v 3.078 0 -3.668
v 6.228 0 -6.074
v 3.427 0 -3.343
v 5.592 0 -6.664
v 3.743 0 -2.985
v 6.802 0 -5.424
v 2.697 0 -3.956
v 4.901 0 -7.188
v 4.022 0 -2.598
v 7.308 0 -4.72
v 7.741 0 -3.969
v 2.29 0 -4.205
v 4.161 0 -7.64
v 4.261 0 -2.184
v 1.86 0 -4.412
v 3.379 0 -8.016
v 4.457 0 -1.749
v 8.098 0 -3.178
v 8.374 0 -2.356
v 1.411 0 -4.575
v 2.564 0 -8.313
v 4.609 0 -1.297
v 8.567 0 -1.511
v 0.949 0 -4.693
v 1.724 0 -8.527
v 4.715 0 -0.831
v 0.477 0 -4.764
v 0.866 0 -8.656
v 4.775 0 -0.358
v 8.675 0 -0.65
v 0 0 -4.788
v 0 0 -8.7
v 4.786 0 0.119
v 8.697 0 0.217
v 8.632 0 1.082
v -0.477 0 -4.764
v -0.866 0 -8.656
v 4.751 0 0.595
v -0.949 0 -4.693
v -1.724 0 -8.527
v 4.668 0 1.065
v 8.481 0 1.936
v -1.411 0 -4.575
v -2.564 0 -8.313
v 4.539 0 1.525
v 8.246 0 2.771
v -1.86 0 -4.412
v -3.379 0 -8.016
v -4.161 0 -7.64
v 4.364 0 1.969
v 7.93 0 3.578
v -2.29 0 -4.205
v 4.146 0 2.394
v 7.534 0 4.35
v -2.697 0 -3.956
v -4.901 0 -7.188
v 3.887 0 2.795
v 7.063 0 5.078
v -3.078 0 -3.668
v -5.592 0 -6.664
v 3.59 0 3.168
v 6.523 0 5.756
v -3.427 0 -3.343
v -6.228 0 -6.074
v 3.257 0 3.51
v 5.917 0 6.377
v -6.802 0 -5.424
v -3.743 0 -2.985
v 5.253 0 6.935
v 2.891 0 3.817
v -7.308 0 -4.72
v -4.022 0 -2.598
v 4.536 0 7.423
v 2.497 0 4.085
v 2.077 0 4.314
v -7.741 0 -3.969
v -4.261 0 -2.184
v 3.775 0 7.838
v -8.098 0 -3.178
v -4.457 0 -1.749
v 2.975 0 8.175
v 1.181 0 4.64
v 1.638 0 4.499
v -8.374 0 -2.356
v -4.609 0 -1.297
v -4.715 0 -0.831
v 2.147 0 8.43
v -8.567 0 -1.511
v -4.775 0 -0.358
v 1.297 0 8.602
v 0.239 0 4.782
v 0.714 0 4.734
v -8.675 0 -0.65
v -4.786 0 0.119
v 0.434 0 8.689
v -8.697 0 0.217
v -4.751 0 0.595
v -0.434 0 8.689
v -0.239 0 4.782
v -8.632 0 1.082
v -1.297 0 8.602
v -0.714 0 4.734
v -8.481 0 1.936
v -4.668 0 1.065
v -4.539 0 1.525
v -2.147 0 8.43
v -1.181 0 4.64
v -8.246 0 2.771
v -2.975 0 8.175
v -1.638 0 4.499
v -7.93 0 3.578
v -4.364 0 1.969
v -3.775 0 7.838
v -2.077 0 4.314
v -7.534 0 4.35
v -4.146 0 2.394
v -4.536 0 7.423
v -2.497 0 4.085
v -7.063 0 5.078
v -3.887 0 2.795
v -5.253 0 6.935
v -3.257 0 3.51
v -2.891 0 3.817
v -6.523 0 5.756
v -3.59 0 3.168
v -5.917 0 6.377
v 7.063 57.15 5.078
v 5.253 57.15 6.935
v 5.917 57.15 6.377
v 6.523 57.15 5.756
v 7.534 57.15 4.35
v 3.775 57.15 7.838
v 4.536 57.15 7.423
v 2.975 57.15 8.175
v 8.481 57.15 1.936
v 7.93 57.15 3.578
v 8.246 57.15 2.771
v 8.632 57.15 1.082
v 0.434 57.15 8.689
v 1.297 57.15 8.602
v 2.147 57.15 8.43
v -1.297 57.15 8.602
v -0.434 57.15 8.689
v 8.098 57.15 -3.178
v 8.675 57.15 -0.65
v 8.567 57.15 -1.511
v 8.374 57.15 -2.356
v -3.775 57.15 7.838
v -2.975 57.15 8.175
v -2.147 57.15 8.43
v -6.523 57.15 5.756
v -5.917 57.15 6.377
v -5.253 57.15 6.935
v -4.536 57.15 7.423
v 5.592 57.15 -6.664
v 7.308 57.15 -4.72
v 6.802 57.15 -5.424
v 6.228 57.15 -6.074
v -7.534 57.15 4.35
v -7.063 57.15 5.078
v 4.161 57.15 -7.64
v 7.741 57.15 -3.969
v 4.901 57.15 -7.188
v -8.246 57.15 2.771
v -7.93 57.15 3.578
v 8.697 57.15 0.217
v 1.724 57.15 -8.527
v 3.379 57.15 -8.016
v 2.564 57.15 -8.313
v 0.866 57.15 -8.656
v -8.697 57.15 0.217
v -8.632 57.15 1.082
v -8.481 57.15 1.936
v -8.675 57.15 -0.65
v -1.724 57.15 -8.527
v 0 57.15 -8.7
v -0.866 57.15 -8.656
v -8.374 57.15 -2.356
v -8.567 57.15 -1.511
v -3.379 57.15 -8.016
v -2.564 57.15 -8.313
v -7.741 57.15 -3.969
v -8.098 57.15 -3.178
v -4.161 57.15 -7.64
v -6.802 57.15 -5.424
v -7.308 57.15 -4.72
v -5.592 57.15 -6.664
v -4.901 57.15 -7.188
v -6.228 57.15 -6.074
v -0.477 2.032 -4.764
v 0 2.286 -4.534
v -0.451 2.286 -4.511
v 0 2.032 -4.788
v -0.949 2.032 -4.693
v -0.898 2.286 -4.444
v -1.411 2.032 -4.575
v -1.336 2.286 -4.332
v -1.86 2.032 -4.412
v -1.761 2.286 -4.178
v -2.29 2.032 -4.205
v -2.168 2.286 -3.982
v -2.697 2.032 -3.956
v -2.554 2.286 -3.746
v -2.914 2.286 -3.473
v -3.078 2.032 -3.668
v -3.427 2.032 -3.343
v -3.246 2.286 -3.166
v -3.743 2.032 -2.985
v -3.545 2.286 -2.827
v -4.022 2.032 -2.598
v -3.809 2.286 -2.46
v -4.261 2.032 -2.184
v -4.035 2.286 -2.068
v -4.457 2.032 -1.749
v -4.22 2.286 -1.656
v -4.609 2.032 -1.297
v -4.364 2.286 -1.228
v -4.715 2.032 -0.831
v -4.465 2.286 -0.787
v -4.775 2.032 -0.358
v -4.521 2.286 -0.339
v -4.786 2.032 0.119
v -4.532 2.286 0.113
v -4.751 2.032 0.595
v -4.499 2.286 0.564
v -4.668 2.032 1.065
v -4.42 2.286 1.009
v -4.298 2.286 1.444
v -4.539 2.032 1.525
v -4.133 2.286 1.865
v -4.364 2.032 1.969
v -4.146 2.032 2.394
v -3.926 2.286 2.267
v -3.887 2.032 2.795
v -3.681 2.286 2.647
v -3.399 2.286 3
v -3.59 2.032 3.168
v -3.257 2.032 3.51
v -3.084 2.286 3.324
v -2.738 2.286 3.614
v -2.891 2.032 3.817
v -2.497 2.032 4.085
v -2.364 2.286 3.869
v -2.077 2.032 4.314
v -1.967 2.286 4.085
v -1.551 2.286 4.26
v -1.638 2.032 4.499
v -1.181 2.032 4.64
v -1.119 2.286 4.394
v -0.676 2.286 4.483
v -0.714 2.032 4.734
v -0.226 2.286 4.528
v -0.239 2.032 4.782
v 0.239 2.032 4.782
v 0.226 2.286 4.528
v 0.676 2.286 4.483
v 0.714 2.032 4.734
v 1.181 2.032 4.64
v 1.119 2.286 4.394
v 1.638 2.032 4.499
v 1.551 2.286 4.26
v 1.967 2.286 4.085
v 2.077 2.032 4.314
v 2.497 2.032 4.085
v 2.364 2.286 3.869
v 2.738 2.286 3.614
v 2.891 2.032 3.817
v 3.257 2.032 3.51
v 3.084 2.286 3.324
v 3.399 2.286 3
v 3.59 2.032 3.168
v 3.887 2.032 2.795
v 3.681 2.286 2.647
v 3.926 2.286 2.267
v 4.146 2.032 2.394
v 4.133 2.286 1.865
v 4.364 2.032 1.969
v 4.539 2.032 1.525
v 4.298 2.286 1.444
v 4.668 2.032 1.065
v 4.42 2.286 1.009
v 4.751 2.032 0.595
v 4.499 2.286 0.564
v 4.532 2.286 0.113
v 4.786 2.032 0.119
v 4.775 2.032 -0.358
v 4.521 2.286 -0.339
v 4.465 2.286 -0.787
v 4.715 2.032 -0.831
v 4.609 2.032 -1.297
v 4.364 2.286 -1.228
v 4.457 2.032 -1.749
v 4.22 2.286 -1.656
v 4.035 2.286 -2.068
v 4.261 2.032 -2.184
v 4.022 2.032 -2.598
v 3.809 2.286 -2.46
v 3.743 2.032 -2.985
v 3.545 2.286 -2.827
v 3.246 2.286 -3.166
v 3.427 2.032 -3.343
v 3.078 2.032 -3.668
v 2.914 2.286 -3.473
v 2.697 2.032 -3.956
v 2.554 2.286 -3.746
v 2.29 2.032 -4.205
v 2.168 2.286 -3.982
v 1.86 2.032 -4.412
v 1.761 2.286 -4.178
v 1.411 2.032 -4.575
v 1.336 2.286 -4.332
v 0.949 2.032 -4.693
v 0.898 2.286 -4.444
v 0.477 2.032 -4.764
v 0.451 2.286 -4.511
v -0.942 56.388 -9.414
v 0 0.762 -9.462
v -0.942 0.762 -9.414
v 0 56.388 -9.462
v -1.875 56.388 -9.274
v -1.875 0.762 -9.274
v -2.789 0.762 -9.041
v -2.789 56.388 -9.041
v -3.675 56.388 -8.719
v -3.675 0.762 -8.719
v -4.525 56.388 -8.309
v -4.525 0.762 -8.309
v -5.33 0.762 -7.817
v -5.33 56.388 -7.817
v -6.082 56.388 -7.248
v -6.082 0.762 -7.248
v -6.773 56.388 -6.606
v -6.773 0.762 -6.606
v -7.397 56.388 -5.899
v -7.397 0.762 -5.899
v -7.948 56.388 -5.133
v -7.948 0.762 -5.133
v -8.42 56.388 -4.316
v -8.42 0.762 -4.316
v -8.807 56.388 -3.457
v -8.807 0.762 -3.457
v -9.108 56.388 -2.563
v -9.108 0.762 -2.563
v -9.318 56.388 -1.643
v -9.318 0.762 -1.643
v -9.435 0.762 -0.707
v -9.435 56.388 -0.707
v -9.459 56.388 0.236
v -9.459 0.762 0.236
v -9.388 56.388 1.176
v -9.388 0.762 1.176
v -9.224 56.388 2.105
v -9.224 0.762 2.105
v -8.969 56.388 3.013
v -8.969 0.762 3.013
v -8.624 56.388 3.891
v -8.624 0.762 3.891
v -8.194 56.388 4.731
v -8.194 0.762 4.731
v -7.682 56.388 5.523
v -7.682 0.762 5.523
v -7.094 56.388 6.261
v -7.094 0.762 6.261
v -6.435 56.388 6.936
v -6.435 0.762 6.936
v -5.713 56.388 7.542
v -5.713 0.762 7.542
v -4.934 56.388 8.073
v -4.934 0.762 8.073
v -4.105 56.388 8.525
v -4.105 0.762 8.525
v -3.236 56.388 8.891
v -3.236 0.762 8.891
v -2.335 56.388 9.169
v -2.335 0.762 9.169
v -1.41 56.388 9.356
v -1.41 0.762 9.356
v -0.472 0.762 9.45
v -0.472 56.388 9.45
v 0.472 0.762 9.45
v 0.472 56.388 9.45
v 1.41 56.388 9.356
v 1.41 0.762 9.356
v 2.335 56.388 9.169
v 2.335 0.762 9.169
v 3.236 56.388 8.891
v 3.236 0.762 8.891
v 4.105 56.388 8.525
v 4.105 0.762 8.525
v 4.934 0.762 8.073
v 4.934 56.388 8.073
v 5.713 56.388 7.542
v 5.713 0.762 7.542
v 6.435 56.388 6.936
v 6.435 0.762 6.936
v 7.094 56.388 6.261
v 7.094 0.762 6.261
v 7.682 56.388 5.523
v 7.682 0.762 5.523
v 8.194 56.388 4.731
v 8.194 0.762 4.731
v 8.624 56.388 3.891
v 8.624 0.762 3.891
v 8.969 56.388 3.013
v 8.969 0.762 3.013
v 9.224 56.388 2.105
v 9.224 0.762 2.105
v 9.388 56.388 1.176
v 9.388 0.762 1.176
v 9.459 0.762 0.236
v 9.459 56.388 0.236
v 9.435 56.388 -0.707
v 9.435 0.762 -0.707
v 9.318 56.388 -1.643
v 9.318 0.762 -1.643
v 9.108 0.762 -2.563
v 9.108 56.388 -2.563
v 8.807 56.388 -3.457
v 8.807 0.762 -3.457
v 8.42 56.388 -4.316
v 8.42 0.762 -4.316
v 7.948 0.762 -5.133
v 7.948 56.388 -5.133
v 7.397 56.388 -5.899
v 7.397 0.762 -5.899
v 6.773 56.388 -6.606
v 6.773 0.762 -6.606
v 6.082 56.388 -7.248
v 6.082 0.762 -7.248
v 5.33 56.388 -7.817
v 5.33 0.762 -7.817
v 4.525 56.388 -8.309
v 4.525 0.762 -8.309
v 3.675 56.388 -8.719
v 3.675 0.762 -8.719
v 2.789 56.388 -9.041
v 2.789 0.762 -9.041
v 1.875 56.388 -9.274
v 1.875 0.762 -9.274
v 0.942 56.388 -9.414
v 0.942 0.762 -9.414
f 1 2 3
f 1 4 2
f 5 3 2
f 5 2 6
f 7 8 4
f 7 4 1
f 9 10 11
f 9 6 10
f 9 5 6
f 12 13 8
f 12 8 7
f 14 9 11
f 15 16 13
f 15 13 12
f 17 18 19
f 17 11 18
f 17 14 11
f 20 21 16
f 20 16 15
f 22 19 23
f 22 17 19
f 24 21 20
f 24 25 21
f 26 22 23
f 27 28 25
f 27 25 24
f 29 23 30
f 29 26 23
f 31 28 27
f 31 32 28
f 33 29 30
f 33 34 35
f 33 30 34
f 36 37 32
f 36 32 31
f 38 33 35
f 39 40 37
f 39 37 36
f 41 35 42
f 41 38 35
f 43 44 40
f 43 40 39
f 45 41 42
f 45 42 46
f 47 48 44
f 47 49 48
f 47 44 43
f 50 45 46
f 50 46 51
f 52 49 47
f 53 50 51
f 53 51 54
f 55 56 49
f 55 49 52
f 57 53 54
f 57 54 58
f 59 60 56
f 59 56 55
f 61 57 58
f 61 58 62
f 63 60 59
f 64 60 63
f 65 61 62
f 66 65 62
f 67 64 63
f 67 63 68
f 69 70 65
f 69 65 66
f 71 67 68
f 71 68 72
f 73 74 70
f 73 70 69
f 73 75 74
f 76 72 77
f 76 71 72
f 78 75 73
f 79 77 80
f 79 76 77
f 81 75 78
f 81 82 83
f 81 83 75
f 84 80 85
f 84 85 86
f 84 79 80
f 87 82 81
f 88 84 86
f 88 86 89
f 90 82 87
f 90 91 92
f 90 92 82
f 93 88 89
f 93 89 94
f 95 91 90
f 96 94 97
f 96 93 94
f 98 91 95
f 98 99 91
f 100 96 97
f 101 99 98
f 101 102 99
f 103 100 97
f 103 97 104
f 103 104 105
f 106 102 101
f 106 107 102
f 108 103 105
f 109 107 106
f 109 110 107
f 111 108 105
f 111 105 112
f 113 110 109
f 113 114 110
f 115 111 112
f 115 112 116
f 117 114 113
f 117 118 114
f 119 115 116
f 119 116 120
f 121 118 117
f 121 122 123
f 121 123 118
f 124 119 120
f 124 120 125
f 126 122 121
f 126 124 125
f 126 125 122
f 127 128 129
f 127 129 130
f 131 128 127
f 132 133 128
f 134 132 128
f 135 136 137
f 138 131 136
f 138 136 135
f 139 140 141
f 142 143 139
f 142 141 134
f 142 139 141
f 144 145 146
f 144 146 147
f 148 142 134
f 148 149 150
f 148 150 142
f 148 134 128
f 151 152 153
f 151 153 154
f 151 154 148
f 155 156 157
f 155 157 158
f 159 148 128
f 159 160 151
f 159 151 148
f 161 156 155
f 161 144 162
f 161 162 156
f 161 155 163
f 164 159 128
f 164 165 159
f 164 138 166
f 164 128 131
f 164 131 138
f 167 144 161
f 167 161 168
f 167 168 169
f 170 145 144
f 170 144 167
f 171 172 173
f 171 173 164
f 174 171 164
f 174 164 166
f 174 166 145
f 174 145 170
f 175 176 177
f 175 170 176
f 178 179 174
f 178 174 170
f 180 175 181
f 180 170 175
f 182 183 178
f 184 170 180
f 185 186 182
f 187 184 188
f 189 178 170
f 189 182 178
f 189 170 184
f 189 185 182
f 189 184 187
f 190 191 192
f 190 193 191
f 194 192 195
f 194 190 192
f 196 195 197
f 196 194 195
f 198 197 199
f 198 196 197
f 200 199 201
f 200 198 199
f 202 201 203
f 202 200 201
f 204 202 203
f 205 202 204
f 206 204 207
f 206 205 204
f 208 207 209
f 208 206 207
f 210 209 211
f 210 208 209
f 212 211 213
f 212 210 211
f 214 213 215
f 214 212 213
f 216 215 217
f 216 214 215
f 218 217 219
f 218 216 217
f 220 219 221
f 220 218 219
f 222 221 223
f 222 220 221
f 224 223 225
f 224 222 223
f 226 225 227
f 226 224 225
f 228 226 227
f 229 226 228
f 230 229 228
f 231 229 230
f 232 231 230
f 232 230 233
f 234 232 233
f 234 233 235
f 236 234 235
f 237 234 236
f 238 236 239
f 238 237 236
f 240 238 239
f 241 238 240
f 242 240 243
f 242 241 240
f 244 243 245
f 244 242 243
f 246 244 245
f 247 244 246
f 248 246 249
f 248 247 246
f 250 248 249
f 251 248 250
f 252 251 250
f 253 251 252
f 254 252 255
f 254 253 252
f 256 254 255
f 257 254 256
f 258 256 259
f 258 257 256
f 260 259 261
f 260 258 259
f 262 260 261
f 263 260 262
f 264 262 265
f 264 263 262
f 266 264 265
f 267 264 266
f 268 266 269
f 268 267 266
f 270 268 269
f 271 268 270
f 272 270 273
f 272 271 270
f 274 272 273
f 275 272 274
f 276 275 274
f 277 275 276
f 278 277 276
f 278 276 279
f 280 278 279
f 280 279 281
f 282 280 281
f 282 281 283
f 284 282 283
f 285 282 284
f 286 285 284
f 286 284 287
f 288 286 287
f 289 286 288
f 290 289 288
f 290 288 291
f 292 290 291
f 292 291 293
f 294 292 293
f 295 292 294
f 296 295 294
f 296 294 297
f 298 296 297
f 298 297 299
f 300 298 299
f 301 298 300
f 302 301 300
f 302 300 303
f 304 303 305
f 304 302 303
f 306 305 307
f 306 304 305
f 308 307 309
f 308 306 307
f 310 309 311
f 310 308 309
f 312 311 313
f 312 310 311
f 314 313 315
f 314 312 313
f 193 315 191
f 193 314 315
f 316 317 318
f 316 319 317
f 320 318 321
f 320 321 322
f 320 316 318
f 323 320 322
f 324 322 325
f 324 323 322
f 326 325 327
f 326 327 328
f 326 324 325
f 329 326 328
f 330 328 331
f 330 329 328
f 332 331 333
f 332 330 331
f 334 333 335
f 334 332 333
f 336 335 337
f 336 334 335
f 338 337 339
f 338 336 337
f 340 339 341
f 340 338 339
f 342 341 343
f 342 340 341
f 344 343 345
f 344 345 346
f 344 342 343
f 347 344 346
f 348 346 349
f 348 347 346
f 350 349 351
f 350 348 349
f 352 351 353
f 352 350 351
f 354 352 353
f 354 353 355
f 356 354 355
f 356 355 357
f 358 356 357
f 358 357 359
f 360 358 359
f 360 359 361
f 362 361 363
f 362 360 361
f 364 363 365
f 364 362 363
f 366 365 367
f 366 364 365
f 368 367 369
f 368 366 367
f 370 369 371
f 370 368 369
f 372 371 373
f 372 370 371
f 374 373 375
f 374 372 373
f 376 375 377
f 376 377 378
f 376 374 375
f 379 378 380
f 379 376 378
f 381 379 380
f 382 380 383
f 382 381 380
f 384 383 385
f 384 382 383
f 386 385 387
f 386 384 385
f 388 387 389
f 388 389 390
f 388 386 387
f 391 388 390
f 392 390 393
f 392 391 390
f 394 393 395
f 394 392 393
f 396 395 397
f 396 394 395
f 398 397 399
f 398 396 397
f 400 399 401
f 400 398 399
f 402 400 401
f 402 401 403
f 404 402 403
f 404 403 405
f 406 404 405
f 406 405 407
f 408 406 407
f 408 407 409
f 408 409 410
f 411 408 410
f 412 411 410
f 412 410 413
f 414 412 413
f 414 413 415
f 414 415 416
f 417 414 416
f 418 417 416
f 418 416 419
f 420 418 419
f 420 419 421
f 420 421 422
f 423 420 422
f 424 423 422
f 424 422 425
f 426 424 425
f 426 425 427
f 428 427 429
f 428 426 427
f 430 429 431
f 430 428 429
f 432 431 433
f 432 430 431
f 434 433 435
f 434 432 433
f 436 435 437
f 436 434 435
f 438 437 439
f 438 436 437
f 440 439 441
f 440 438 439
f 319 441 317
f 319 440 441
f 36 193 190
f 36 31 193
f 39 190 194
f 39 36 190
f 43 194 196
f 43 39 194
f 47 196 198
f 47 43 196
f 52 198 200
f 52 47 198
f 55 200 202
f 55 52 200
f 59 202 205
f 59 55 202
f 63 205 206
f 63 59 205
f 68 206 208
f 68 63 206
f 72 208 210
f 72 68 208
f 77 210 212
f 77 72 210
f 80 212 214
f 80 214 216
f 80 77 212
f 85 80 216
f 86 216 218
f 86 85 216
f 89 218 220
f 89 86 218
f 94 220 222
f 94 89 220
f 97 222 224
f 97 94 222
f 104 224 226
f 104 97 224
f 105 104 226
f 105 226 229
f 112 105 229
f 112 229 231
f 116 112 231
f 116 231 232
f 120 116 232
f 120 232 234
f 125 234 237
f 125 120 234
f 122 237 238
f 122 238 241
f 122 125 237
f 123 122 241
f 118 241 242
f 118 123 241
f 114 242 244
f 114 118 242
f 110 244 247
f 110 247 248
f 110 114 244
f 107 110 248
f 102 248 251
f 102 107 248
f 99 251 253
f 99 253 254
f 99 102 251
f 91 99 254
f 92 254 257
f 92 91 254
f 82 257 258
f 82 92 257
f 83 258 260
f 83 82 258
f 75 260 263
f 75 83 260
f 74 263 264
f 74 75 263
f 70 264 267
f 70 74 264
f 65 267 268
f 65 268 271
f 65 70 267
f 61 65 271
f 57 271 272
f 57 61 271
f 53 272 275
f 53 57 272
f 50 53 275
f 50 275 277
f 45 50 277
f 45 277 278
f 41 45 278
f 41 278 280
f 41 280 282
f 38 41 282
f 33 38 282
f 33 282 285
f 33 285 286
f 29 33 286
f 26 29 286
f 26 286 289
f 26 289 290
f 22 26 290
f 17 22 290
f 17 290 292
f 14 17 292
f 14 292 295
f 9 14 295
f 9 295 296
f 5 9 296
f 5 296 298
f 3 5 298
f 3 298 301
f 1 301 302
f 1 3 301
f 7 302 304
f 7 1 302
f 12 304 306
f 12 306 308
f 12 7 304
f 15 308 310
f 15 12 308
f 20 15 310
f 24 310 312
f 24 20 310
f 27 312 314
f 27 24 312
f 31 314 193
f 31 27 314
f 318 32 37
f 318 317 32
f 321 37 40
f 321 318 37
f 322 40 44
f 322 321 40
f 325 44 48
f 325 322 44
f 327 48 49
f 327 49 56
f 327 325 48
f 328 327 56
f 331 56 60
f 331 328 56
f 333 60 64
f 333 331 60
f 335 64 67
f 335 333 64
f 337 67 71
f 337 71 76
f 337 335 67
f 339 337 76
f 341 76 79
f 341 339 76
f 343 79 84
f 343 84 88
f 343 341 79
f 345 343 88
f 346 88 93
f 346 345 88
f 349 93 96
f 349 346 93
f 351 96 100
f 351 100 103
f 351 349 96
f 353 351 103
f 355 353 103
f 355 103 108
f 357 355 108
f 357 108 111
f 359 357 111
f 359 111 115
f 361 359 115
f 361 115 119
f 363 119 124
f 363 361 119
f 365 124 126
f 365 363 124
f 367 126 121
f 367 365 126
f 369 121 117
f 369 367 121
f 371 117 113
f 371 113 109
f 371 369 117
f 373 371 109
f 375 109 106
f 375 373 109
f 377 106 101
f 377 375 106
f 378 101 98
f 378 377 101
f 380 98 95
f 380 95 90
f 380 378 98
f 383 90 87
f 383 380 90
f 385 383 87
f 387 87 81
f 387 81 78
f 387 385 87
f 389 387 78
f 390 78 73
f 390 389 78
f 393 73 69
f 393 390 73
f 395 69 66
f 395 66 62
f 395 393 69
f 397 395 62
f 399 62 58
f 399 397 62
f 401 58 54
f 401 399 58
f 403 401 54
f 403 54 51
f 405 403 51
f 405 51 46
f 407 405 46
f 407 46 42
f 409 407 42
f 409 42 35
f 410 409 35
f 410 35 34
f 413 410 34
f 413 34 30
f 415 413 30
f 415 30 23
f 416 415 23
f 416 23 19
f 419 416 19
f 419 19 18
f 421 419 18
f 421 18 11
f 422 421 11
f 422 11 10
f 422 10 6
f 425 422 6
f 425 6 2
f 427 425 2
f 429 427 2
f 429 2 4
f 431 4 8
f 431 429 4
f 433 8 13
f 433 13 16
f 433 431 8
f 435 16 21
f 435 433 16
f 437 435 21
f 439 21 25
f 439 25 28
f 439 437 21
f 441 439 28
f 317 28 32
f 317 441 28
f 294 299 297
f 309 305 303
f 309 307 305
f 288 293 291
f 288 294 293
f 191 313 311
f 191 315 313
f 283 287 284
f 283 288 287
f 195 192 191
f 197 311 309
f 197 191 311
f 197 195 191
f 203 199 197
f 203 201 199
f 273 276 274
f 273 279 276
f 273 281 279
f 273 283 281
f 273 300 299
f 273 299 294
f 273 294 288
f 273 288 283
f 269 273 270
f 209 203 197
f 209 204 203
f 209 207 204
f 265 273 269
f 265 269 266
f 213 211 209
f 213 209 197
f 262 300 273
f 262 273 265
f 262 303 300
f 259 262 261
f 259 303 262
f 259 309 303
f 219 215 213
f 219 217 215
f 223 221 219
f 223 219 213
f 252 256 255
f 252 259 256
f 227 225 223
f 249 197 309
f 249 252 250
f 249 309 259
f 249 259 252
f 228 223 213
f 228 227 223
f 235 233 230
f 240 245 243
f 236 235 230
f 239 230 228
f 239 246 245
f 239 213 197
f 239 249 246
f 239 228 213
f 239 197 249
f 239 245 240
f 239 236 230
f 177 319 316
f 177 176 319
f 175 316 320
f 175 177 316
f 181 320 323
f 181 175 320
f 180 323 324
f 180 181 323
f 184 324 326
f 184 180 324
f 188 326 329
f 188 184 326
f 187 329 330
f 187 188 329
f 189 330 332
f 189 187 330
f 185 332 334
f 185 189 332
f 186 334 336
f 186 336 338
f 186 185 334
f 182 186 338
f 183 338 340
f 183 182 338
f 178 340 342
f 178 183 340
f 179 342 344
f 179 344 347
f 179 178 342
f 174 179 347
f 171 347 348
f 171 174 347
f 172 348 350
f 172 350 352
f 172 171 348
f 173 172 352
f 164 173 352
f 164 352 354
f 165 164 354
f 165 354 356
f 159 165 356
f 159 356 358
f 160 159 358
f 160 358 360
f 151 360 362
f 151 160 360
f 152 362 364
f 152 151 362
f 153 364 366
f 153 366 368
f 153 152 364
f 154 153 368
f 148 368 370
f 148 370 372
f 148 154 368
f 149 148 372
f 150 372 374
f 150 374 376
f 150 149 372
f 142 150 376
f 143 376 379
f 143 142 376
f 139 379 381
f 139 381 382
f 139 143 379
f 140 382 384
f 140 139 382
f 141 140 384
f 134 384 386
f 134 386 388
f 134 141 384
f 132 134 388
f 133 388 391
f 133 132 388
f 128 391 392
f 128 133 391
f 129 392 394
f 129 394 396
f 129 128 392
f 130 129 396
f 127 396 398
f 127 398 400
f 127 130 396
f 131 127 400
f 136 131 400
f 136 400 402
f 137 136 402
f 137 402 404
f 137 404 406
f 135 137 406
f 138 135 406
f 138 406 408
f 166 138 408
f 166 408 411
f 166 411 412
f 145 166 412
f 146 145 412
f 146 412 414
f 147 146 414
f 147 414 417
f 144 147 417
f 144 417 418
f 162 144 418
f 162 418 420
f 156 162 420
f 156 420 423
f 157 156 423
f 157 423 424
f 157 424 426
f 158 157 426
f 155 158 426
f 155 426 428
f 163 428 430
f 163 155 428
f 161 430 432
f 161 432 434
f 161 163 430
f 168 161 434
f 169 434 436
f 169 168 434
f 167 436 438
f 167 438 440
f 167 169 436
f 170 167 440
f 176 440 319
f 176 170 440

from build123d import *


with BuildPart() as part:
    # Sketch1 → Revolve1 (revolve)
    with BuildSketch(Plane.XY, mode=Mode.PRIVATE) as revolve1_sk:
        Polygon((9.4615, 0.762), (9.4615, 56.388), (8.6995, 57.15), (0, 57.15), (0, 2.286), (4.5339, 2.286), (4.7879, 2.032), (4.7879, 0), (8.6995, 0), align=None)
    revolve(revolve1_sk.sketch.rotate(Axis((0, 0, 0), (0, 1, 0)), 90), axis=Axis((0, 0, 0), (0, 1, 0)))  # turned: the seam where the file's is


solid = part.part
